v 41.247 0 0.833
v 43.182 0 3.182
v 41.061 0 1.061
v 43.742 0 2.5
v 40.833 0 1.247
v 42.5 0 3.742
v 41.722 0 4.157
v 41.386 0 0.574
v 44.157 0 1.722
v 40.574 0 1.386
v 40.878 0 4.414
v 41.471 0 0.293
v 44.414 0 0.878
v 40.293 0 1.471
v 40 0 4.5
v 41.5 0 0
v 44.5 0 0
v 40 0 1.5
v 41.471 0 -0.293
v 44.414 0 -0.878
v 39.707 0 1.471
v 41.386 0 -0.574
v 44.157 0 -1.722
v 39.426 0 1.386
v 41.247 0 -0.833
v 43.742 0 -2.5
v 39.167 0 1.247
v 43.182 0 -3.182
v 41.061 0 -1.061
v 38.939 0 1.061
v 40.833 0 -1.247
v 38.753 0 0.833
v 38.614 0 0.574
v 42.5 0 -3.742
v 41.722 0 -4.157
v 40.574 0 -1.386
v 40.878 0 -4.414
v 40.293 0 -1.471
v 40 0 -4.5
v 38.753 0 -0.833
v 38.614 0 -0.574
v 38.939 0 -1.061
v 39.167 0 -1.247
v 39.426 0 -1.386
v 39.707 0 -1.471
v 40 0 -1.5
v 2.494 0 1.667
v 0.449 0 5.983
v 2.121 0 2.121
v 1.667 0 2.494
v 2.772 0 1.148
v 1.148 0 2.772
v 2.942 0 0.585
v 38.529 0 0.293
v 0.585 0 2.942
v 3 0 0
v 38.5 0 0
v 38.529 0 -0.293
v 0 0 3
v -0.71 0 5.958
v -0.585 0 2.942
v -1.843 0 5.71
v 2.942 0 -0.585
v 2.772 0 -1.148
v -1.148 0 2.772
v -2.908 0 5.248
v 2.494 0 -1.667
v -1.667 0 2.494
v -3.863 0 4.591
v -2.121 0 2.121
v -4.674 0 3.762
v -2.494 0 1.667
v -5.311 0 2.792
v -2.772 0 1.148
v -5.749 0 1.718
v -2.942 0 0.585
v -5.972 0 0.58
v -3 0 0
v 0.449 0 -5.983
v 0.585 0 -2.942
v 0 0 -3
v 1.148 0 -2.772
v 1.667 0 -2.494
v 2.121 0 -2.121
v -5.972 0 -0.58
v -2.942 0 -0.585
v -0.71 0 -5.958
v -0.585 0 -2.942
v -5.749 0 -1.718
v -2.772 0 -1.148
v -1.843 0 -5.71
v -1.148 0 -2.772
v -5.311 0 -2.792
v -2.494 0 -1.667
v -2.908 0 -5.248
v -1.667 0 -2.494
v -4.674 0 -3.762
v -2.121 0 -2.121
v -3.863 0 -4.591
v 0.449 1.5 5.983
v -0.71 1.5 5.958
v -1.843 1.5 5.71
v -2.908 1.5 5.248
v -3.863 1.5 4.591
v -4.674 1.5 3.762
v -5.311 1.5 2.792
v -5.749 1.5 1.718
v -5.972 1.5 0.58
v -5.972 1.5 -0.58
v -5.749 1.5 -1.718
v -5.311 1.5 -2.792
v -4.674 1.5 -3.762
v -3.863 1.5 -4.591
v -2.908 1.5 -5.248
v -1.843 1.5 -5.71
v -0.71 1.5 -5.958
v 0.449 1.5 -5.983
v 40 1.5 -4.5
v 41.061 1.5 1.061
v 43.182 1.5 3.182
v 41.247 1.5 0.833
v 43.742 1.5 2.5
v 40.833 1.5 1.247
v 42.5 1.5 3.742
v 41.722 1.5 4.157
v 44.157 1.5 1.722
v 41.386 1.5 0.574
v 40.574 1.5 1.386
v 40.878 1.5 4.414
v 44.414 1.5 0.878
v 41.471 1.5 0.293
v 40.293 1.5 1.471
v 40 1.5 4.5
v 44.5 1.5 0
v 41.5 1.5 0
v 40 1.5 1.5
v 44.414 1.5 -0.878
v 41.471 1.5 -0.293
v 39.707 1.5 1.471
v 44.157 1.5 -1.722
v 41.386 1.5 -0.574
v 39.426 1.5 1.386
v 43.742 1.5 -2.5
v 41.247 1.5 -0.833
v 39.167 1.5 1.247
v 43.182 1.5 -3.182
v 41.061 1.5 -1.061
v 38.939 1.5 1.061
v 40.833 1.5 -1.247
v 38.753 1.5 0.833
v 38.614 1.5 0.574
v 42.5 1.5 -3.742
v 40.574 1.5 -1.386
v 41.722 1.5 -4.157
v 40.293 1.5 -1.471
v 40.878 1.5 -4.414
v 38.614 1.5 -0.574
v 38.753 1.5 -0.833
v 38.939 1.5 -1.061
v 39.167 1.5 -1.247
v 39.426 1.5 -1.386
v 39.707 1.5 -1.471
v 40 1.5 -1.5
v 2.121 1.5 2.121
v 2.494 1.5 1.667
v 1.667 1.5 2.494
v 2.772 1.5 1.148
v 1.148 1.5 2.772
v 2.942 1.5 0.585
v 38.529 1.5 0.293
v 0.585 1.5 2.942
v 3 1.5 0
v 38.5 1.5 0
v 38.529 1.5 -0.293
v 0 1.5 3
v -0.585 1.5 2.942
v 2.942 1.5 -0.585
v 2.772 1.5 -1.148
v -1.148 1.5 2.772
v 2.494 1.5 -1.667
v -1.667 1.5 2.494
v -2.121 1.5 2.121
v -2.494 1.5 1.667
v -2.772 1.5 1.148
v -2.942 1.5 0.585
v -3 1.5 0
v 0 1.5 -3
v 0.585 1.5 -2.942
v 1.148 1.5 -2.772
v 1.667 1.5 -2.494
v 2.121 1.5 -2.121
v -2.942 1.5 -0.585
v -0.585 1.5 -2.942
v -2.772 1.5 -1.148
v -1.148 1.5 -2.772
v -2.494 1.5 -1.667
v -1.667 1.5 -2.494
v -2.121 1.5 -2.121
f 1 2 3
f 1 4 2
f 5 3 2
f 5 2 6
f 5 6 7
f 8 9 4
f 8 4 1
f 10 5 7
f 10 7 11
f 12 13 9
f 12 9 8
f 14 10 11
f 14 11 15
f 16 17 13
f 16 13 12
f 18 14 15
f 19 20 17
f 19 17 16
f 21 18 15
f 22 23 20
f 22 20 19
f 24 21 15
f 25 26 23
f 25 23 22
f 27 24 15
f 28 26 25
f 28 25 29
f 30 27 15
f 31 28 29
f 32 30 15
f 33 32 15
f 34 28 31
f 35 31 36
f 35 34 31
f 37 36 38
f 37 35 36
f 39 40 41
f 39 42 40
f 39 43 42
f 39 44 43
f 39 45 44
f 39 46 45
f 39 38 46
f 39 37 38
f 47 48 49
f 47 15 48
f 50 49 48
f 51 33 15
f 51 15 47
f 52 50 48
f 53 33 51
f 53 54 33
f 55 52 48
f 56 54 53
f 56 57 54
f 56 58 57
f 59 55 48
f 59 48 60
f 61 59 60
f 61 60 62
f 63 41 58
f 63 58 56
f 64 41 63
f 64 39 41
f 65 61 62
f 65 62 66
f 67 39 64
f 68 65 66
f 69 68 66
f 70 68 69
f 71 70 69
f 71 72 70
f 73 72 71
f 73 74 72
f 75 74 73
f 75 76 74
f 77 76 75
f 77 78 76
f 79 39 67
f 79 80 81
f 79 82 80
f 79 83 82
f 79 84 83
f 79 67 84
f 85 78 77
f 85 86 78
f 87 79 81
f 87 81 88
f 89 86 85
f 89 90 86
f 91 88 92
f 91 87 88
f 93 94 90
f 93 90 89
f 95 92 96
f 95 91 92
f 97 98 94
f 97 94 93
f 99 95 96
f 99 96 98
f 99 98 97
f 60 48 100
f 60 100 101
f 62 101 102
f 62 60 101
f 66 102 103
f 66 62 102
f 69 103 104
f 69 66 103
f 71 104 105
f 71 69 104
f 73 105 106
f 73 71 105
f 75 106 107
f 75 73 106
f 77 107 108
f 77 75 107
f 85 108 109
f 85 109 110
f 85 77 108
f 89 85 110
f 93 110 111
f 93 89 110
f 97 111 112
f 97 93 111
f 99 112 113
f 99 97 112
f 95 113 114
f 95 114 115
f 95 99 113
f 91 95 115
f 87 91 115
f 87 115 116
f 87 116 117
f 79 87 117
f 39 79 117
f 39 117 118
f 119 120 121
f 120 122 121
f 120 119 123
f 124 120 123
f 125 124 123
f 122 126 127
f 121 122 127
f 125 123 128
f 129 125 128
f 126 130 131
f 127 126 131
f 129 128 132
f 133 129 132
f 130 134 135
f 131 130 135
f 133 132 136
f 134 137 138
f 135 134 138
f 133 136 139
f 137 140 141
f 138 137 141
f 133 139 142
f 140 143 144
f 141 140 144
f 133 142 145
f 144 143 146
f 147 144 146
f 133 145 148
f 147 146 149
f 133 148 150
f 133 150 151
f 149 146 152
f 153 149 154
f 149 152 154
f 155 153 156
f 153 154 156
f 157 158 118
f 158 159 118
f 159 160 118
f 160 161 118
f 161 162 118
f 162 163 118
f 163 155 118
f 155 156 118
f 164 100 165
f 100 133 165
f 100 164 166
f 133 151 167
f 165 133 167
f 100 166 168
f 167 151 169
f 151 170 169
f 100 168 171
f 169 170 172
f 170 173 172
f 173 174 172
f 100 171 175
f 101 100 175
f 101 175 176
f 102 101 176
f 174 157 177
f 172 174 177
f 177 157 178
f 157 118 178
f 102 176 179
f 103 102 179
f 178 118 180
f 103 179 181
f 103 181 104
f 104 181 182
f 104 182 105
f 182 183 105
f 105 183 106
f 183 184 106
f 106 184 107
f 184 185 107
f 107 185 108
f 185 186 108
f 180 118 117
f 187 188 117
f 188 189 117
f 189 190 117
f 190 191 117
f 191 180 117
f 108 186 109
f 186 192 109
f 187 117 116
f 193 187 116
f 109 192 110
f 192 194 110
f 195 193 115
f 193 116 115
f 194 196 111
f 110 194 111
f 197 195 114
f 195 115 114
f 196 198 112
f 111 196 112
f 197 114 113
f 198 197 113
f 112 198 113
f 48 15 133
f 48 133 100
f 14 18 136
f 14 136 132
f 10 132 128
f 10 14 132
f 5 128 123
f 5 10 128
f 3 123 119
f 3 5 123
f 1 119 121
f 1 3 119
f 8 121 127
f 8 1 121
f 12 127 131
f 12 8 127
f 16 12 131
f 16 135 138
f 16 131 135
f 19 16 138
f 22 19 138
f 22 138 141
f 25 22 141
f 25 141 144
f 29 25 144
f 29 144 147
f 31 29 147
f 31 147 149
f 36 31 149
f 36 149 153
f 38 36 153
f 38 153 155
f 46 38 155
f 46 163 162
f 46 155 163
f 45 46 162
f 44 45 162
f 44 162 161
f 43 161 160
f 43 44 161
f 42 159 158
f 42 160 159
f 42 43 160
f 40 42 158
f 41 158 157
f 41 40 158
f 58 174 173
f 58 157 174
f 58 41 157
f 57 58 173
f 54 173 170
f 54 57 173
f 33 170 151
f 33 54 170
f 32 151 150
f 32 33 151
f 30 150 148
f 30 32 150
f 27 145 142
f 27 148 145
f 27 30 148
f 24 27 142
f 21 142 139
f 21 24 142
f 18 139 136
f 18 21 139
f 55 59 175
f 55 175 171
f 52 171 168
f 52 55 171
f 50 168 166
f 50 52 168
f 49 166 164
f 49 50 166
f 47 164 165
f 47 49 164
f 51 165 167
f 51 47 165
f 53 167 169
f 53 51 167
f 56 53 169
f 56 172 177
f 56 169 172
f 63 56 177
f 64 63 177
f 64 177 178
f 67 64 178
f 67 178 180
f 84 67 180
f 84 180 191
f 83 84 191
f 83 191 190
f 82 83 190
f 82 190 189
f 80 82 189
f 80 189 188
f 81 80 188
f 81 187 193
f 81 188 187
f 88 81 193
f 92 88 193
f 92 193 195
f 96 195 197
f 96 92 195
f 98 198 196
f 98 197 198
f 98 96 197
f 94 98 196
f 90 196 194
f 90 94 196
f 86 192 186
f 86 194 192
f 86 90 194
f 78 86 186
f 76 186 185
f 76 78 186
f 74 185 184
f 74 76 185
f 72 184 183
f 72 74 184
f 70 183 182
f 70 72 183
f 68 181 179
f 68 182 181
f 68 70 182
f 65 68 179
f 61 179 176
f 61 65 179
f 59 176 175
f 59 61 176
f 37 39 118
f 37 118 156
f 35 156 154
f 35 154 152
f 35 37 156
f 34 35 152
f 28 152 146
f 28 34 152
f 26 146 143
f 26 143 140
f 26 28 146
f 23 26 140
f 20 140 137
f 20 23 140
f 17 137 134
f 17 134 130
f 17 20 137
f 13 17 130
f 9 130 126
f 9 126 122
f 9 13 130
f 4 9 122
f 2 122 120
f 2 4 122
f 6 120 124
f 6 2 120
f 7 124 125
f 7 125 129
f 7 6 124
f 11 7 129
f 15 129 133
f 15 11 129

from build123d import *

# Parameters (mm, degrees)
BOSS_EXTRUDE1_DEPTH     = 1.5
CUT_EXTRUDE1_DEPTH      = 16
CUT_EXTRUDE1_DEPTH_BACK = 10.5
SKETCH2_R               = 3
SKETCH2_R_2             = 1.5


with BuildPart() as part:
    # Sketch1 → Boss-Extrude1 (new body)
    with BuildSketch(Plane(origin=(0, 0, 0), x_dir=(1, 0, 0), z_dir=(0, 1, 0))):
        with BuildLine():
            Line((0.449368076, 5.983148697), (40, 4.5))
            ThreePointArc((40, 4.5), (44.5, 0), (40, -4.5))
            Line((40, -4.5), (0.449368076, -5.983148697))
            ThreePointArc((0.449368076, -5.983148697), (-6, 0), (0.449368076, 5.983148697))
        make_face()
    extrude(amount=BOSS_EXTRUDE1_DEPTH)

    # Sketch2 → Cut-Extrude1 (cut, two sides: drawn at the far end of the back side and taken through both)
    with BuildSketch(Plane(origin=(0, 1.5, 0), x_dir=(1, 0, 0), z_dir=(0, 1, 0)).offset(-CUT_EXTRUDE1_DEPTH_BACK)):
        with Locations(Location((0, 0, 0), (0, 0, 270))):
            Circle(SKETCH2_R)
        with Locations(Location((40, 0, 0), (0, 0, 270))):
            Circle(SKETCH2_R_2)
    extrude(amount=CUT_EXTRUDE1_DEPTH + CUT_EXTRUDE1_DEPTH_BACK, mode=Mode.SUBTRACT)


solid = part.part
